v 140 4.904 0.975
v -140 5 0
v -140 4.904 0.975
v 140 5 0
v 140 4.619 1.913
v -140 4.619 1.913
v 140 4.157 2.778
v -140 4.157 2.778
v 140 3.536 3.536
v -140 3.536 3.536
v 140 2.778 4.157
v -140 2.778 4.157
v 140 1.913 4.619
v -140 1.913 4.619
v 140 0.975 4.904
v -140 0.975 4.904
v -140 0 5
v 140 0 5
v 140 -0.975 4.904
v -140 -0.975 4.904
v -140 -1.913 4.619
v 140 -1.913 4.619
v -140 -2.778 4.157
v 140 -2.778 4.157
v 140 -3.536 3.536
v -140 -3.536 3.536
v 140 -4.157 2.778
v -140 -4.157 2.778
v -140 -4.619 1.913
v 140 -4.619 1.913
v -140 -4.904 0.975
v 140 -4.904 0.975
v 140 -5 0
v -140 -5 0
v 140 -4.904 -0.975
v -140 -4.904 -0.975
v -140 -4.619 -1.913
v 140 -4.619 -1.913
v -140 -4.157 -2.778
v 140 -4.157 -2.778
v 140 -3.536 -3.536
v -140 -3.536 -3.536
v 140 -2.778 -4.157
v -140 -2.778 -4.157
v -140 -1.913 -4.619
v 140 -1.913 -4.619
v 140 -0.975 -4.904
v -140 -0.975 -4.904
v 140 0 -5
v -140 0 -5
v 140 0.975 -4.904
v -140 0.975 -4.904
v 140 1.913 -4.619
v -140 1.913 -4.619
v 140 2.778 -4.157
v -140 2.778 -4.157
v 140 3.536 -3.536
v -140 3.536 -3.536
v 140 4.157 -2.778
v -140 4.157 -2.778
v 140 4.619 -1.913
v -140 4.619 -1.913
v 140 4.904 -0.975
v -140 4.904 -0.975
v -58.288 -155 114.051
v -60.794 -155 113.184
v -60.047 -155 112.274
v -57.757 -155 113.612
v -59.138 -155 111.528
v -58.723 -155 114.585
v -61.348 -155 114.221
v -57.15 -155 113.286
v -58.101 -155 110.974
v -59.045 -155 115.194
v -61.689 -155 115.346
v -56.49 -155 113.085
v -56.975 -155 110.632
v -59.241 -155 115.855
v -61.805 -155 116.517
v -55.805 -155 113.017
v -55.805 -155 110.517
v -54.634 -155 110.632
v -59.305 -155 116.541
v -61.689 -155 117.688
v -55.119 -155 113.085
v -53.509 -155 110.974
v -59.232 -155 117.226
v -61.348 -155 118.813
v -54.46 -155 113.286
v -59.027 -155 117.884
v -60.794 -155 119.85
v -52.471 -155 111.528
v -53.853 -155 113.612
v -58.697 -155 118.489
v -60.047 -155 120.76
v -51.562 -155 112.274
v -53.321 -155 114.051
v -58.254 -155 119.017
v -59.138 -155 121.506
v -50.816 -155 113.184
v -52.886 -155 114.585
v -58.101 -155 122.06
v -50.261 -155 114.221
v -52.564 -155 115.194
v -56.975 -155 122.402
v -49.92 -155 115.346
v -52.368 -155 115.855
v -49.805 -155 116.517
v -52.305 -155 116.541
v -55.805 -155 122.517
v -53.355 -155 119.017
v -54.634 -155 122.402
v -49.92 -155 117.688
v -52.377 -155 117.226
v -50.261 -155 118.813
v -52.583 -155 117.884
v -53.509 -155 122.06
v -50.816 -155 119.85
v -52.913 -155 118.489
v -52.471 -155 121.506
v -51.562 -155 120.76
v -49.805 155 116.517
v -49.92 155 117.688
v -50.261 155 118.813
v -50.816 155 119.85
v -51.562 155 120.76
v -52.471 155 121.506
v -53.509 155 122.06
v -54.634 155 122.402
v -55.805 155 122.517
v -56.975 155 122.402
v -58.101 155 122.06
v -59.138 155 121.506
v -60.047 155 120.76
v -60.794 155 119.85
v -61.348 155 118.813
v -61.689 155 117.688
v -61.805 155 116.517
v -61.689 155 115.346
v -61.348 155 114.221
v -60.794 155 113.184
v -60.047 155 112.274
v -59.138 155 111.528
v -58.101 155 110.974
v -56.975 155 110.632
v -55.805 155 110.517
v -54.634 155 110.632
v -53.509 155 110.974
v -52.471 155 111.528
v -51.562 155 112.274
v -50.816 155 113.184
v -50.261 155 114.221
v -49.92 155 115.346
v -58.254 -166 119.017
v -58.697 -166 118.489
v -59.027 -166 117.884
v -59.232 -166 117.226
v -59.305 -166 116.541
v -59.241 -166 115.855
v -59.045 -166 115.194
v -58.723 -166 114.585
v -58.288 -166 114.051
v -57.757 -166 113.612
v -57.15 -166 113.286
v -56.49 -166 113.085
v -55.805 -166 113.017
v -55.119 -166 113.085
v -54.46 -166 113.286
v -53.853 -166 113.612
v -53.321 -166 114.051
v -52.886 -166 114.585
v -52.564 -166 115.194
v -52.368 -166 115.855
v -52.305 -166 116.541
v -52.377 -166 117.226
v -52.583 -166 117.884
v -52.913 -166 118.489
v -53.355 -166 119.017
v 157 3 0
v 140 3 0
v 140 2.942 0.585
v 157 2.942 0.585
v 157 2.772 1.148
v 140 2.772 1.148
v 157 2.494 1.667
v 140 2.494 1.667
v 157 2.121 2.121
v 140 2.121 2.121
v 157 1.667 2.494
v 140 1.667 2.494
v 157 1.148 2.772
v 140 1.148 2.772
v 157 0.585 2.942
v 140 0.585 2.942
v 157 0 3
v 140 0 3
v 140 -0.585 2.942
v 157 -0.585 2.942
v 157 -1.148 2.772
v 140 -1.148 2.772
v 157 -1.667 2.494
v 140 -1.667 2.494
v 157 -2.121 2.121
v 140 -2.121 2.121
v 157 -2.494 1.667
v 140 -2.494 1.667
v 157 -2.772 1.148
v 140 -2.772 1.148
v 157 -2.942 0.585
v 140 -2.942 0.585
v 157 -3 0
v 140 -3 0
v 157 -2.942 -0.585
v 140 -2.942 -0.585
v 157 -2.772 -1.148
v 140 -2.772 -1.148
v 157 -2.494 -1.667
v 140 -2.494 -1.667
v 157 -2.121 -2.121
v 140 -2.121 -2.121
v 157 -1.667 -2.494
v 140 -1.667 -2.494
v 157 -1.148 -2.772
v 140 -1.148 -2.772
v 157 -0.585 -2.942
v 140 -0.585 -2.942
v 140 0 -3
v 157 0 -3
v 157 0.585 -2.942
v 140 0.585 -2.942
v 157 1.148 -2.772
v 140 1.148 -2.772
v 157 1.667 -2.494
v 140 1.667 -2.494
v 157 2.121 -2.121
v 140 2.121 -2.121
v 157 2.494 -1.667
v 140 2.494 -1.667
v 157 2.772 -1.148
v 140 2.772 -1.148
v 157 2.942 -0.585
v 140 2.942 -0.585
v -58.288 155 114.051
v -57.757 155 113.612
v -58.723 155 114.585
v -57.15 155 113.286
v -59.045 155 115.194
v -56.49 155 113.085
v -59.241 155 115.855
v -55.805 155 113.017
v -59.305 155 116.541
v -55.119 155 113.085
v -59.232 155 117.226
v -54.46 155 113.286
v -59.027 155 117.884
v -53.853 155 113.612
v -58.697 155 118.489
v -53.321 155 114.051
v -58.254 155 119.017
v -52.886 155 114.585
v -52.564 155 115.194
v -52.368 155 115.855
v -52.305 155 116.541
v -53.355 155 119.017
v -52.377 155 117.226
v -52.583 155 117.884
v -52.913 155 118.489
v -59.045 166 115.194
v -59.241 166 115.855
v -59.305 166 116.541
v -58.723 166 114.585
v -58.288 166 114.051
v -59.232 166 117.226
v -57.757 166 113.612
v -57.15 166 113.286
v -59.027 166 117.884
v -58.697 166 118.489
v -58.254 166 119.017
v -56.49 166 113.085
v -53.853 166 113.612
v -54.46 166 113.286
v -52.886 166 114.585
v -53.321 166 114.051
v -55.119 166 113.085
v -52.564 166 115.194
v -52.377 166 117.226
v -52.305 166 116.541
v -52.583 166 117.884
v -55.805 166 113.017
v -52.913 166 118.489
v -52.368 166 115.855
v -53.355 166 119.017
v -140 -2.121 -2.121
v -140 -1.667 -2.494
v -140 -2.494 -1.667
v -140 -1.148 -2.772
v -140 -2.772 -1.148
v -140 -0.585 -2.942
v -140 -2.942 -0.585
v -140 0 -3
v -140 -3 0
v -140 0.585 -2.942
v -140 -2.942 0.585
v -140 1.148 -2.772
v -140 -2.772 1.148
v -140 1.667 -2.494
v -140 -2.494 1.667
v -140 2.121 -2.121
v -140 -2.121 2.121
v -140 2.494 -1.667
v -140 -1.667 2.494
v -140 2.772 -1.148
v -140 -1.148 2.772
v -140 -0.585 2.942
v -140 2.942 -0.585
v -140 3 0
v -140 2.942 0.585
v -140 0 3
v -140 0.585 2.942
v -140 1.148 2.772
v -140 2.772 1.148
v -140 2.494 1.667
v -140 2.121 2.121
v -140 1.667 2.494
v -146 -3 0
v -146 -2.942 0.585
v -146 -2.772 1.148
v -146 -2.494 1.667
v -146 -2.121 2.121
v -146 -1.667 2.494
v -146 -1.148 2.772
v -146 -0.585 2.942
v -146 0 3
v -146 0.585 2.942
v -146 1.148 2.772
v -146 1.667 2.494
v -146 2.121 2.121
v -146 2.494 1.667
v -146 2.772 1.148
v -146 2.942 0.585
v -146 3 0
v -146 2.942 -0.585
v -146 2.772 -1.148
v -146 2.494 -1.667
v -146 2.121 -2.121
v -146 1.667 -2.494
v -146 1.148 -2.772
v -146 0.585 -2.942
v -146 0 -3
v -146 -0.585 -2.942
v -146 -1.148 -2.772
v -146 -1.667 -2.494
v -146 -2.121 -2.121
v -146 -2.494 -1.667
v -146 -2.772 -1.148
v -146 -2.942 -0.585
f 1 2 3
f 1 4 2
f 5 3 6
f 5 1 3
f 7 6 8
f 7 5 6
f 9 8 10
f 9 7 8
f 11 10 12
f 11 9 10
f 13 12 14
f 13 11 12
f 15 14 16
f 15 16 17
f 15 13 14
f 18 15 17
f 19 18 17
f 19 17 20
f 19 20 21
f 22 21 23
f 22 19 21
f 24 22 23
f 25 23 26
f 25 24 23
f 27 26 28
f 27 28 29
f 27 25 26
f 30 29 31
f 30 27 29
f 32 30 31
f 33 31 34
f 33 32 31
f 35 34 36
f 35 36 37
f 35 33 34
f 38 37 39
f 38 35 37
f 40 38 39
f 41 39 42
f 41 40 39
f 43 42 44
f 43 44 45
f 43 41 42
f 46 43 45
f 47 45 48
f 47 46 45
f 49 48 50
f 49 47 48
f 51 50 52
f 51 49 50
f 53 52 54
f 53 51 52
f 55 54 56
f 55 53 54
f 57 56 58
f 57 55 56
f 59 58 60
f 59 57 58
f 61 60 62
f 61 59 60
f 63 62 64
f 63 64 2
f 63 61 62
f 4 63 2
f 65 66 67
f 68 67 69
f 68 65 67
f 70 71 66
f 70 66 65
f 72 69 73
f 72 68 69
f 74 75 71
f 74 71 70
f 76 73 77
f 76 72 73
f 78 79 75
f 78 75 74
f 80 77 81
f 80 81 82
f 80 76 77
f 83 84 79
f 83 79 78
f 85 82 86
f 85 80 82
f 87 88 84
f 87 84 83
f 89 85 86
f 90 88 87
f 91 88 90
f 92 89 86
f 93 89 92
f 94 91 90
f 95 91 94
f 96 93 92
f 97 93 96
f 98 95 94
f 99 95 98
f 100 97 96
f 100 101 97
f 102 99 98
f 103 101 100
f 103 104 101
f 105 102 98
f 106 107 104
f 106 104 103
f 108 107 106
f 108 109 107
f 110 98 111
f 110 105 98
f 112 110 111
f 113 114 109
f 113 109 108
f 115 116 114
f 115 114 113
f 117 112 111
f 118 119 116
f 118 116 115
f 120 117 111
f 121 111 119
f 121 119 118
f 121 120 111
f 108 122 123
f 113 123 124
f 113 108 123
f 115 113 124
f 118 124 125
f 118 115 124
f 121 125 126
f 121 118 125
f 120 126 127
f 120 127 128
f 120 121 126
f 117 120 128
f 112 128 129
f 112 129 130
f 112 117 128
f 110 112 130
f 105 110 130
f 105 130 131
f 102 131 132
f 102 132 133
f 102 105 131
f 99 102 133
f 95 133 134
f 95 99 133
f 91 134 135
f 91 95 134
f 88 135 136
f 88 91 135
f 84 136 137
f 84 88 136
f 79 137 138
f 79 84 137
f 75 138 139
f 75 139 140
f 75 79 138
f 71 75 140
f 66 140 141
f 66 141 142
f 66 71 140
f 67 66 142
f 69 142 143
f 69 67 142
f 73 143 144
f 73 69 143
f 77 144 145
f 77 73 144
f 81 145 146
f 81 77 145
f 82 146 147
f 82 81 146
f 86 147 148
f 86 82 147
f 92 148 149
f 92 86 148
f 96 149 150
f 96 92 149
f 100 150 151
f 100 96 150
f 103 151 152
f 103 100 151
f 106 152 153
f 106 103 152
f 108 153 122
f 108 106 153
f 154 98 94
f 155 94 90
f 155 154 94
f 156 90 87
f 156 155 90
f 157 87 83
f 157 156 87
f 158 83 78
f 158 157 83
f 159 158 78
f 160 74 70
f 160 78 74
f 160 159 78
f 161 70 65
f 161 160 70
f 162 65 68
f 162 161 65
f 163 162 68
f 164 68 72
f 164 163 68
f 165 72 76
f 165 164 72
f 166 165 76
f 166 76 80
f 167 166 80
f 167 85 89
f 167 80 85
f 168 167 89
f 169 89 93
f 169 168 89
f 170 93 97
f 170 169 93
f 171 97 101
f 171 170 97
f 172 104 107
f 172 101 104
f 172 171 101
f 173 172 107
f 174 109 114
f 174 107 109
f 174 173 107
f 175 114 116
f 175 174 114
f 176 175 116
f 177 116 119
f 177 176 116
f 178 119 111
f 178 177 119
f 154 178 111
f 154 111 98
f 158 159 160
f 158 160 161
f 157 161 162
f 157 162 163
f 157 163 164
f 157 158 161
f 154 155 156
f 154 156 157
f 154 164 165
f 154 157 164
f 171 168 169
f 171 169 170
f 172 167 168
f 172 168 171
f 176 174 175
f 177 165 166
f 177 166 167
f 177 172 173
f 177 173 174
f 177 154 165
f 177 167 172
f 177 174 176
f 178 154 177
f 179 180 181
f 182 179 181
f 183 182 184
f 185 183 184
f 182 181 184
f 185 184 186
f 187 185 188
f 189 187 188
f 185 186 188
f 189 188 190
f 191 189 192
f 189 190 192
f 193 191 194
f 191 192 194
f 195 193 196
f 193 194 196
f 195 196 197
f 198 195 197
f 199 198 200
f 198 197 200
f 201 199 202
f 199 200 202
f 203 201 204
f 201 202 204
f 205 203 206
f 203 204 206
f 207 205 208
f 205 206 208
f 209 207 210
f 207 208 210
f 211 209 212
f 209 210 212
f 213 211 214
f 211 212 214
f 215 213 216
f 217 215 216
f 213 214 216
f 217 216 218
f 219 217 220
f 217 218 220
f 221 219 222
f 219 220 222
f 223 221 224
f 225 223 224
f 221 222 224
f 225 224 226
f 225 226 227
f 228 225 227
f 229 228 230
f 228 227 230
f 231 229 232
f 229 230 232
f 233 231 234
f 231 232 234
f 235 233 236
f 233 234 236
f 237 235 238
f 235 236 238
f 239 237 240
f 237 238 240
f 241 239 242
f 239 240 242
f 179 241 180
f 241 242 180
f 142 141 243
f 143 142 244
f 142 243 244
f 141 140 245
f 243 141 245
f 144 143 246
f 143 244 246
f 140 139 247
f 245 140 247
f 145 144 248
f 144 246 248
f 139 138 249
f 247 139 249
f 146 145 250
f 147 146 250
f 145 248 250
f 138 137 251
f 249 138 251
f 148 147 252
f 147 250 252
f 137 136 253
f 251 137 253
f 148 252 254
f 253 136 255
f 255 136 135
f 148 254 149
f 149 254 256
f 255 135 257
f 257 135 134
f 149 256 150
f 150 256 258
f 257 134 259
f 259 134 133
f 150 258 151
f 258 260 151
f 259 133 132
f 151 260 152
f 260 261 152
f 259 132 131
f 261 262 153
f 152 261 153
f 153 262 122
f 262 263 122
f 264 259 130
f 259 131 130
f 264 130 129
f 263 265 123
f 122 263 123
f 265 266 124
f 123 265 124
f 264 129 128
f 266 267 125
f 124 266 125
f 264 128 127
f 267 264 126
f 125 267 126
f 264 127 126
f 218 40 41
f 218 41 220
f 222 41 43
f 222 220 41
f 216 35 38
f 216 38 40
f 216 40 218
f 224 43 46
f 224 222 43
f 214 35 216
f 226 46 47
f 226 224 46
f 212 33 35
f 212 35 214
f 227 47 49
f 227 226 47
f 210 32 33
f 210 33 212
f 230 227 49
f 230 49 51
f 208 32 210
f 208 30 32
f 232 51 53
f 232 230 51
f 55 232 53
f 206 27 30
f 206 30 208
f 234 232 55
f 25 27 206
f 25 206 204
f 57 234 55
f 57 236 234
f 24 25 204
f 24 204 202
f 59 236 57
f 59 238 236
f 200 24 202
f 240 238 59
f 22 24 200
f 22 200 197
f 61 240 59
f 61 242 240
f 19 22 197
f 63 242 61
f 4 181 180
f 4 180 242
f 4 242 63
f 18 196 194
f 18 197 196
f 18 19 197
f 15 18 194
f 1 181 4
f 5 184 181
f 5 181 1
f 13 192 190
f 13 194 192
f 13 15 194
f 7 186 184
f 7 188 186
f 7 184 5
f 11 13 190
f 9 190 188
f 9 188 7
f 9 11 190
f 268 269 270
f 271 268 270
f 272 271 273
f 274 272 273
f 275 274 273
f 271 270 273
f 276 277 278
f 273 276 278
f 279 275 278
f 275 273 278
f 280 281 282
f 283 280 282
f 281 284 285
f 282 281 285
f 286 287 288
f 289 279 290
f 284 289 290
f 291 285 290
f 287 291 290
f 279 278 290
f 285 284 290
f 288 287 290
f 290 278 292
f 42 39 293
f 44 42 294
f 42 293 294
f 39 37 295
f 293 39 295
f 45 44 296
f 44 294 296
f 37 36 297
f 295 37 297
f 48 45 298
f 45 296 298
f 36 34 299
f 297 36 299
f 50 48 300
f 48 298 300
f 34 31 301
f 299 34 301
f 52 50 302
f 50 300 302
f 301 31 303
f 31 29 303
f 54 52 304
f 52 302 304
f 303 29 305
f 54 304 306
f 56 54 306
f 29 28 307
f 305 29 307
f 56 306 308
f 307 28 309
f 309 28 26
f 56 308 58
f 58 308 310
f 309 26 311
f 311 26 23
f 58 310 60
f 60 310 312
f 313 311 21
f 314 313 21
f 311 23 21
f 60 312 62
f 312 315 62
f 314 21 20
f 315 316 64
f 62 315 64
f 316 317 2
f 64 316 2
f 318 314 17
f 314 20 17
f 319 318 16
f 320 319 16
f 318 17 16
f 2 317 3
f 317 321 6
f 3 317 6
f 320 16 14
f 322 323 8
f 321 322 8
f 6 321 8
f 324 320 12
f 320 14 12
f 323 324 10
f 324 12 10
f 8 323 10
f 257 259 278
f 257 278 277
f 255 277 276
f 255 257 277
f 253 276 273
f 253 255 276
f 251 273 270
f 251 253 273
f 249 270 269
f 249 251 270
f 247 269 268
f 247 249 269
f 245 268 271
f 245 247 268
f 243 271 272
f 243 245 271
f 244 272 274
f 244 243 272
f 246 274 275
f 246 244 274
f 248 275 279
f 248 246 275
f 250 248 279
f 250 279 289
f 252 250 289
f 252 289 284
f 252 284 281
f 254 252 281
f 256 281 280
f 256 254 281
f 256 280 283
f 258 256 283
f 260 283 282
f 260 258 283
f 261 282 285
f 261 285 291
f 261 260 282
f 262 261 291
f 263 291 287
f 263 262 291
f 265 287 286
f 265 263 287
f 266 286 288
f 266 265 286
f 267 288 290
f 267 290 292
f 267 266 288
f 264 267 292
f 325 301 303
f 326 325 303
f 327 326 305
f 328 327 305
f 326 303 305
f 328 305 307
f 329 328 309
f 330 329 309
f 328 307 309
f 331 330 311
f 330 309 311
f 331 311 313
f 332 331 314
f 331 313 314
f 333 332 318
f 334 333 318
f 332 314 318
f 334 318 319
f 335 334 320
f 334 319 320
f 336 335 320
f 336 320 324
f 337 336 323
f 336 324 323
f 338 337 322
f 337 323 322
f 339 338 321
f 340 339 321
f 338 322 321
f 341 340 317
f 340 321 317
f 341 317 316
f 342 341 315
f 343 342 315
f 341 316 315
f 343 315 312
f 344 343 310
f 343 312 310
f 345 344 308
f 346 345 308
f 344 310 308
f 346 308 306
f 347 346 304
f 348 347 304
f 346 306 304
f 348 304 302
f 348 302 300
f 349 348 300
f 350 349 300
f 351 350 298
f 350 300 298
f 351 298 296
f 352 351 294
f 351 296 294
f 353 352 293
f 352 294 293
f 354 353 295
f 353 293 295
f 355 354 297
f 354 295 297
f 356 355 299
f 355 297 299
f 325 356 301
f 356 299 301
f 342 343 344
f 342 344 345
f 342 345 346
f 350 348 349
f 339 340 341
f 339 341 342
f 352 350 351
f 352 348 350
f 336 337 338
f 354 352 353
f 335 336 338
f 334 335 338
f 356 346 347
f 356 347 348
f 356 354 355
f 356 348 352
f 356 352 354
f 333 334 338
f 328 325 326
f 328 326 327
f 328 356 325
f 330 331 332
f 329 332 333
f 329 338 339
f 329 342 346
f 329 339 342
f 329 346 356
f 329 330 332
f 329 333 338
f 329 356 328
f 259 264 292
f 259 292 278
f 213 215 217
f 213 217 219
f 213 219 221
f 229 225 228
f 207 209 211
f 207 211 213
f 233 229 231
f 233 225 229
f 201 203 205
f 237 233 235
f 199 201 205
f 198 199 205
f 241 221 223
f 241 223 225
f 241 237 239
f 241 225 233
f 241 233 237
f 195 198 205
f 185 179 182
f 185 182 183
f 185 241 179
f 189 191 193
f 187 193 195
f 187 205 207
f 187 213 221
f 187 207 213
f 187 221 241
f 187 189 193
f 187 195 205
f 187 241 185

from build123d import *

# Parameters (mm, degrees)
F0_R     = 5
F1_DEPTH = 140
F2_R     = 3
F3_DEPTH = 17
F4_R     = 3
F5_DEPTH = 6
F7_DEPTH = 166
F6_R     = 6
F8_DEPTH = 155


with BuildPart() as f1:
    # F0 (on Right) → F1 (new body, symmetric)
    with BuildSketch(Plane.YZ):
        Circle(F0_R)
    extrude(amount=F1_DEPTH, both=True)

    # F2 (on face) → F3 (join)
    with BuildSketch(Plane.YZ.offset(140)):
        Circle(F2_R)
    extrude(amount=F3_DEPTH)

    # F4 (on face) → F5 (join)
    with BuildSketch(Plane(origin=(-140, 0, 0), x_dir=(0, -1, 0), z_dir=(-1, 0, 0))):
        Circle(F4_R)
    extrude(amount=F5_DEPTH)


with BuildPart() as f7:
    # F6 (on Front) → F7 (new body, symmetric)
    with BuildSketch(Plane.XZ):
        with BuildLine():
            Line((-53.35521285, 119.0169885251), (-58.2541923356, 119.0169885251))
            ThreePointArc((-58.2541923356, 119.0169885251), (-55.8047025928, 113.0169885251), (-53.35521285, 119.0169885251))
        make_face()
    extrude(amount=F7_DEPTH, both=True)

    # F6 (on Front) → F8 (join, symmetric)
    with BuildSketch(Plane.XZ):
        with Locations((-55.8047025928, 116.5169885251)):
            Circle(F6_R)
        with BuildLine():
            ThreePointArc((-53.35521285, 119.0169885251), (-55.8047025928, 113.0169885251), (-58.2541923356, 119.0169885251))
            Line((-58.2541923356, 119.0169885251), (-53.35521285, 119.0169885251))
        make_face(mode=Mode.SUBTRACT)
    extrude(amount=F8_DEPTH, both=True)


solid = Compound([f1.part, f7.part])
